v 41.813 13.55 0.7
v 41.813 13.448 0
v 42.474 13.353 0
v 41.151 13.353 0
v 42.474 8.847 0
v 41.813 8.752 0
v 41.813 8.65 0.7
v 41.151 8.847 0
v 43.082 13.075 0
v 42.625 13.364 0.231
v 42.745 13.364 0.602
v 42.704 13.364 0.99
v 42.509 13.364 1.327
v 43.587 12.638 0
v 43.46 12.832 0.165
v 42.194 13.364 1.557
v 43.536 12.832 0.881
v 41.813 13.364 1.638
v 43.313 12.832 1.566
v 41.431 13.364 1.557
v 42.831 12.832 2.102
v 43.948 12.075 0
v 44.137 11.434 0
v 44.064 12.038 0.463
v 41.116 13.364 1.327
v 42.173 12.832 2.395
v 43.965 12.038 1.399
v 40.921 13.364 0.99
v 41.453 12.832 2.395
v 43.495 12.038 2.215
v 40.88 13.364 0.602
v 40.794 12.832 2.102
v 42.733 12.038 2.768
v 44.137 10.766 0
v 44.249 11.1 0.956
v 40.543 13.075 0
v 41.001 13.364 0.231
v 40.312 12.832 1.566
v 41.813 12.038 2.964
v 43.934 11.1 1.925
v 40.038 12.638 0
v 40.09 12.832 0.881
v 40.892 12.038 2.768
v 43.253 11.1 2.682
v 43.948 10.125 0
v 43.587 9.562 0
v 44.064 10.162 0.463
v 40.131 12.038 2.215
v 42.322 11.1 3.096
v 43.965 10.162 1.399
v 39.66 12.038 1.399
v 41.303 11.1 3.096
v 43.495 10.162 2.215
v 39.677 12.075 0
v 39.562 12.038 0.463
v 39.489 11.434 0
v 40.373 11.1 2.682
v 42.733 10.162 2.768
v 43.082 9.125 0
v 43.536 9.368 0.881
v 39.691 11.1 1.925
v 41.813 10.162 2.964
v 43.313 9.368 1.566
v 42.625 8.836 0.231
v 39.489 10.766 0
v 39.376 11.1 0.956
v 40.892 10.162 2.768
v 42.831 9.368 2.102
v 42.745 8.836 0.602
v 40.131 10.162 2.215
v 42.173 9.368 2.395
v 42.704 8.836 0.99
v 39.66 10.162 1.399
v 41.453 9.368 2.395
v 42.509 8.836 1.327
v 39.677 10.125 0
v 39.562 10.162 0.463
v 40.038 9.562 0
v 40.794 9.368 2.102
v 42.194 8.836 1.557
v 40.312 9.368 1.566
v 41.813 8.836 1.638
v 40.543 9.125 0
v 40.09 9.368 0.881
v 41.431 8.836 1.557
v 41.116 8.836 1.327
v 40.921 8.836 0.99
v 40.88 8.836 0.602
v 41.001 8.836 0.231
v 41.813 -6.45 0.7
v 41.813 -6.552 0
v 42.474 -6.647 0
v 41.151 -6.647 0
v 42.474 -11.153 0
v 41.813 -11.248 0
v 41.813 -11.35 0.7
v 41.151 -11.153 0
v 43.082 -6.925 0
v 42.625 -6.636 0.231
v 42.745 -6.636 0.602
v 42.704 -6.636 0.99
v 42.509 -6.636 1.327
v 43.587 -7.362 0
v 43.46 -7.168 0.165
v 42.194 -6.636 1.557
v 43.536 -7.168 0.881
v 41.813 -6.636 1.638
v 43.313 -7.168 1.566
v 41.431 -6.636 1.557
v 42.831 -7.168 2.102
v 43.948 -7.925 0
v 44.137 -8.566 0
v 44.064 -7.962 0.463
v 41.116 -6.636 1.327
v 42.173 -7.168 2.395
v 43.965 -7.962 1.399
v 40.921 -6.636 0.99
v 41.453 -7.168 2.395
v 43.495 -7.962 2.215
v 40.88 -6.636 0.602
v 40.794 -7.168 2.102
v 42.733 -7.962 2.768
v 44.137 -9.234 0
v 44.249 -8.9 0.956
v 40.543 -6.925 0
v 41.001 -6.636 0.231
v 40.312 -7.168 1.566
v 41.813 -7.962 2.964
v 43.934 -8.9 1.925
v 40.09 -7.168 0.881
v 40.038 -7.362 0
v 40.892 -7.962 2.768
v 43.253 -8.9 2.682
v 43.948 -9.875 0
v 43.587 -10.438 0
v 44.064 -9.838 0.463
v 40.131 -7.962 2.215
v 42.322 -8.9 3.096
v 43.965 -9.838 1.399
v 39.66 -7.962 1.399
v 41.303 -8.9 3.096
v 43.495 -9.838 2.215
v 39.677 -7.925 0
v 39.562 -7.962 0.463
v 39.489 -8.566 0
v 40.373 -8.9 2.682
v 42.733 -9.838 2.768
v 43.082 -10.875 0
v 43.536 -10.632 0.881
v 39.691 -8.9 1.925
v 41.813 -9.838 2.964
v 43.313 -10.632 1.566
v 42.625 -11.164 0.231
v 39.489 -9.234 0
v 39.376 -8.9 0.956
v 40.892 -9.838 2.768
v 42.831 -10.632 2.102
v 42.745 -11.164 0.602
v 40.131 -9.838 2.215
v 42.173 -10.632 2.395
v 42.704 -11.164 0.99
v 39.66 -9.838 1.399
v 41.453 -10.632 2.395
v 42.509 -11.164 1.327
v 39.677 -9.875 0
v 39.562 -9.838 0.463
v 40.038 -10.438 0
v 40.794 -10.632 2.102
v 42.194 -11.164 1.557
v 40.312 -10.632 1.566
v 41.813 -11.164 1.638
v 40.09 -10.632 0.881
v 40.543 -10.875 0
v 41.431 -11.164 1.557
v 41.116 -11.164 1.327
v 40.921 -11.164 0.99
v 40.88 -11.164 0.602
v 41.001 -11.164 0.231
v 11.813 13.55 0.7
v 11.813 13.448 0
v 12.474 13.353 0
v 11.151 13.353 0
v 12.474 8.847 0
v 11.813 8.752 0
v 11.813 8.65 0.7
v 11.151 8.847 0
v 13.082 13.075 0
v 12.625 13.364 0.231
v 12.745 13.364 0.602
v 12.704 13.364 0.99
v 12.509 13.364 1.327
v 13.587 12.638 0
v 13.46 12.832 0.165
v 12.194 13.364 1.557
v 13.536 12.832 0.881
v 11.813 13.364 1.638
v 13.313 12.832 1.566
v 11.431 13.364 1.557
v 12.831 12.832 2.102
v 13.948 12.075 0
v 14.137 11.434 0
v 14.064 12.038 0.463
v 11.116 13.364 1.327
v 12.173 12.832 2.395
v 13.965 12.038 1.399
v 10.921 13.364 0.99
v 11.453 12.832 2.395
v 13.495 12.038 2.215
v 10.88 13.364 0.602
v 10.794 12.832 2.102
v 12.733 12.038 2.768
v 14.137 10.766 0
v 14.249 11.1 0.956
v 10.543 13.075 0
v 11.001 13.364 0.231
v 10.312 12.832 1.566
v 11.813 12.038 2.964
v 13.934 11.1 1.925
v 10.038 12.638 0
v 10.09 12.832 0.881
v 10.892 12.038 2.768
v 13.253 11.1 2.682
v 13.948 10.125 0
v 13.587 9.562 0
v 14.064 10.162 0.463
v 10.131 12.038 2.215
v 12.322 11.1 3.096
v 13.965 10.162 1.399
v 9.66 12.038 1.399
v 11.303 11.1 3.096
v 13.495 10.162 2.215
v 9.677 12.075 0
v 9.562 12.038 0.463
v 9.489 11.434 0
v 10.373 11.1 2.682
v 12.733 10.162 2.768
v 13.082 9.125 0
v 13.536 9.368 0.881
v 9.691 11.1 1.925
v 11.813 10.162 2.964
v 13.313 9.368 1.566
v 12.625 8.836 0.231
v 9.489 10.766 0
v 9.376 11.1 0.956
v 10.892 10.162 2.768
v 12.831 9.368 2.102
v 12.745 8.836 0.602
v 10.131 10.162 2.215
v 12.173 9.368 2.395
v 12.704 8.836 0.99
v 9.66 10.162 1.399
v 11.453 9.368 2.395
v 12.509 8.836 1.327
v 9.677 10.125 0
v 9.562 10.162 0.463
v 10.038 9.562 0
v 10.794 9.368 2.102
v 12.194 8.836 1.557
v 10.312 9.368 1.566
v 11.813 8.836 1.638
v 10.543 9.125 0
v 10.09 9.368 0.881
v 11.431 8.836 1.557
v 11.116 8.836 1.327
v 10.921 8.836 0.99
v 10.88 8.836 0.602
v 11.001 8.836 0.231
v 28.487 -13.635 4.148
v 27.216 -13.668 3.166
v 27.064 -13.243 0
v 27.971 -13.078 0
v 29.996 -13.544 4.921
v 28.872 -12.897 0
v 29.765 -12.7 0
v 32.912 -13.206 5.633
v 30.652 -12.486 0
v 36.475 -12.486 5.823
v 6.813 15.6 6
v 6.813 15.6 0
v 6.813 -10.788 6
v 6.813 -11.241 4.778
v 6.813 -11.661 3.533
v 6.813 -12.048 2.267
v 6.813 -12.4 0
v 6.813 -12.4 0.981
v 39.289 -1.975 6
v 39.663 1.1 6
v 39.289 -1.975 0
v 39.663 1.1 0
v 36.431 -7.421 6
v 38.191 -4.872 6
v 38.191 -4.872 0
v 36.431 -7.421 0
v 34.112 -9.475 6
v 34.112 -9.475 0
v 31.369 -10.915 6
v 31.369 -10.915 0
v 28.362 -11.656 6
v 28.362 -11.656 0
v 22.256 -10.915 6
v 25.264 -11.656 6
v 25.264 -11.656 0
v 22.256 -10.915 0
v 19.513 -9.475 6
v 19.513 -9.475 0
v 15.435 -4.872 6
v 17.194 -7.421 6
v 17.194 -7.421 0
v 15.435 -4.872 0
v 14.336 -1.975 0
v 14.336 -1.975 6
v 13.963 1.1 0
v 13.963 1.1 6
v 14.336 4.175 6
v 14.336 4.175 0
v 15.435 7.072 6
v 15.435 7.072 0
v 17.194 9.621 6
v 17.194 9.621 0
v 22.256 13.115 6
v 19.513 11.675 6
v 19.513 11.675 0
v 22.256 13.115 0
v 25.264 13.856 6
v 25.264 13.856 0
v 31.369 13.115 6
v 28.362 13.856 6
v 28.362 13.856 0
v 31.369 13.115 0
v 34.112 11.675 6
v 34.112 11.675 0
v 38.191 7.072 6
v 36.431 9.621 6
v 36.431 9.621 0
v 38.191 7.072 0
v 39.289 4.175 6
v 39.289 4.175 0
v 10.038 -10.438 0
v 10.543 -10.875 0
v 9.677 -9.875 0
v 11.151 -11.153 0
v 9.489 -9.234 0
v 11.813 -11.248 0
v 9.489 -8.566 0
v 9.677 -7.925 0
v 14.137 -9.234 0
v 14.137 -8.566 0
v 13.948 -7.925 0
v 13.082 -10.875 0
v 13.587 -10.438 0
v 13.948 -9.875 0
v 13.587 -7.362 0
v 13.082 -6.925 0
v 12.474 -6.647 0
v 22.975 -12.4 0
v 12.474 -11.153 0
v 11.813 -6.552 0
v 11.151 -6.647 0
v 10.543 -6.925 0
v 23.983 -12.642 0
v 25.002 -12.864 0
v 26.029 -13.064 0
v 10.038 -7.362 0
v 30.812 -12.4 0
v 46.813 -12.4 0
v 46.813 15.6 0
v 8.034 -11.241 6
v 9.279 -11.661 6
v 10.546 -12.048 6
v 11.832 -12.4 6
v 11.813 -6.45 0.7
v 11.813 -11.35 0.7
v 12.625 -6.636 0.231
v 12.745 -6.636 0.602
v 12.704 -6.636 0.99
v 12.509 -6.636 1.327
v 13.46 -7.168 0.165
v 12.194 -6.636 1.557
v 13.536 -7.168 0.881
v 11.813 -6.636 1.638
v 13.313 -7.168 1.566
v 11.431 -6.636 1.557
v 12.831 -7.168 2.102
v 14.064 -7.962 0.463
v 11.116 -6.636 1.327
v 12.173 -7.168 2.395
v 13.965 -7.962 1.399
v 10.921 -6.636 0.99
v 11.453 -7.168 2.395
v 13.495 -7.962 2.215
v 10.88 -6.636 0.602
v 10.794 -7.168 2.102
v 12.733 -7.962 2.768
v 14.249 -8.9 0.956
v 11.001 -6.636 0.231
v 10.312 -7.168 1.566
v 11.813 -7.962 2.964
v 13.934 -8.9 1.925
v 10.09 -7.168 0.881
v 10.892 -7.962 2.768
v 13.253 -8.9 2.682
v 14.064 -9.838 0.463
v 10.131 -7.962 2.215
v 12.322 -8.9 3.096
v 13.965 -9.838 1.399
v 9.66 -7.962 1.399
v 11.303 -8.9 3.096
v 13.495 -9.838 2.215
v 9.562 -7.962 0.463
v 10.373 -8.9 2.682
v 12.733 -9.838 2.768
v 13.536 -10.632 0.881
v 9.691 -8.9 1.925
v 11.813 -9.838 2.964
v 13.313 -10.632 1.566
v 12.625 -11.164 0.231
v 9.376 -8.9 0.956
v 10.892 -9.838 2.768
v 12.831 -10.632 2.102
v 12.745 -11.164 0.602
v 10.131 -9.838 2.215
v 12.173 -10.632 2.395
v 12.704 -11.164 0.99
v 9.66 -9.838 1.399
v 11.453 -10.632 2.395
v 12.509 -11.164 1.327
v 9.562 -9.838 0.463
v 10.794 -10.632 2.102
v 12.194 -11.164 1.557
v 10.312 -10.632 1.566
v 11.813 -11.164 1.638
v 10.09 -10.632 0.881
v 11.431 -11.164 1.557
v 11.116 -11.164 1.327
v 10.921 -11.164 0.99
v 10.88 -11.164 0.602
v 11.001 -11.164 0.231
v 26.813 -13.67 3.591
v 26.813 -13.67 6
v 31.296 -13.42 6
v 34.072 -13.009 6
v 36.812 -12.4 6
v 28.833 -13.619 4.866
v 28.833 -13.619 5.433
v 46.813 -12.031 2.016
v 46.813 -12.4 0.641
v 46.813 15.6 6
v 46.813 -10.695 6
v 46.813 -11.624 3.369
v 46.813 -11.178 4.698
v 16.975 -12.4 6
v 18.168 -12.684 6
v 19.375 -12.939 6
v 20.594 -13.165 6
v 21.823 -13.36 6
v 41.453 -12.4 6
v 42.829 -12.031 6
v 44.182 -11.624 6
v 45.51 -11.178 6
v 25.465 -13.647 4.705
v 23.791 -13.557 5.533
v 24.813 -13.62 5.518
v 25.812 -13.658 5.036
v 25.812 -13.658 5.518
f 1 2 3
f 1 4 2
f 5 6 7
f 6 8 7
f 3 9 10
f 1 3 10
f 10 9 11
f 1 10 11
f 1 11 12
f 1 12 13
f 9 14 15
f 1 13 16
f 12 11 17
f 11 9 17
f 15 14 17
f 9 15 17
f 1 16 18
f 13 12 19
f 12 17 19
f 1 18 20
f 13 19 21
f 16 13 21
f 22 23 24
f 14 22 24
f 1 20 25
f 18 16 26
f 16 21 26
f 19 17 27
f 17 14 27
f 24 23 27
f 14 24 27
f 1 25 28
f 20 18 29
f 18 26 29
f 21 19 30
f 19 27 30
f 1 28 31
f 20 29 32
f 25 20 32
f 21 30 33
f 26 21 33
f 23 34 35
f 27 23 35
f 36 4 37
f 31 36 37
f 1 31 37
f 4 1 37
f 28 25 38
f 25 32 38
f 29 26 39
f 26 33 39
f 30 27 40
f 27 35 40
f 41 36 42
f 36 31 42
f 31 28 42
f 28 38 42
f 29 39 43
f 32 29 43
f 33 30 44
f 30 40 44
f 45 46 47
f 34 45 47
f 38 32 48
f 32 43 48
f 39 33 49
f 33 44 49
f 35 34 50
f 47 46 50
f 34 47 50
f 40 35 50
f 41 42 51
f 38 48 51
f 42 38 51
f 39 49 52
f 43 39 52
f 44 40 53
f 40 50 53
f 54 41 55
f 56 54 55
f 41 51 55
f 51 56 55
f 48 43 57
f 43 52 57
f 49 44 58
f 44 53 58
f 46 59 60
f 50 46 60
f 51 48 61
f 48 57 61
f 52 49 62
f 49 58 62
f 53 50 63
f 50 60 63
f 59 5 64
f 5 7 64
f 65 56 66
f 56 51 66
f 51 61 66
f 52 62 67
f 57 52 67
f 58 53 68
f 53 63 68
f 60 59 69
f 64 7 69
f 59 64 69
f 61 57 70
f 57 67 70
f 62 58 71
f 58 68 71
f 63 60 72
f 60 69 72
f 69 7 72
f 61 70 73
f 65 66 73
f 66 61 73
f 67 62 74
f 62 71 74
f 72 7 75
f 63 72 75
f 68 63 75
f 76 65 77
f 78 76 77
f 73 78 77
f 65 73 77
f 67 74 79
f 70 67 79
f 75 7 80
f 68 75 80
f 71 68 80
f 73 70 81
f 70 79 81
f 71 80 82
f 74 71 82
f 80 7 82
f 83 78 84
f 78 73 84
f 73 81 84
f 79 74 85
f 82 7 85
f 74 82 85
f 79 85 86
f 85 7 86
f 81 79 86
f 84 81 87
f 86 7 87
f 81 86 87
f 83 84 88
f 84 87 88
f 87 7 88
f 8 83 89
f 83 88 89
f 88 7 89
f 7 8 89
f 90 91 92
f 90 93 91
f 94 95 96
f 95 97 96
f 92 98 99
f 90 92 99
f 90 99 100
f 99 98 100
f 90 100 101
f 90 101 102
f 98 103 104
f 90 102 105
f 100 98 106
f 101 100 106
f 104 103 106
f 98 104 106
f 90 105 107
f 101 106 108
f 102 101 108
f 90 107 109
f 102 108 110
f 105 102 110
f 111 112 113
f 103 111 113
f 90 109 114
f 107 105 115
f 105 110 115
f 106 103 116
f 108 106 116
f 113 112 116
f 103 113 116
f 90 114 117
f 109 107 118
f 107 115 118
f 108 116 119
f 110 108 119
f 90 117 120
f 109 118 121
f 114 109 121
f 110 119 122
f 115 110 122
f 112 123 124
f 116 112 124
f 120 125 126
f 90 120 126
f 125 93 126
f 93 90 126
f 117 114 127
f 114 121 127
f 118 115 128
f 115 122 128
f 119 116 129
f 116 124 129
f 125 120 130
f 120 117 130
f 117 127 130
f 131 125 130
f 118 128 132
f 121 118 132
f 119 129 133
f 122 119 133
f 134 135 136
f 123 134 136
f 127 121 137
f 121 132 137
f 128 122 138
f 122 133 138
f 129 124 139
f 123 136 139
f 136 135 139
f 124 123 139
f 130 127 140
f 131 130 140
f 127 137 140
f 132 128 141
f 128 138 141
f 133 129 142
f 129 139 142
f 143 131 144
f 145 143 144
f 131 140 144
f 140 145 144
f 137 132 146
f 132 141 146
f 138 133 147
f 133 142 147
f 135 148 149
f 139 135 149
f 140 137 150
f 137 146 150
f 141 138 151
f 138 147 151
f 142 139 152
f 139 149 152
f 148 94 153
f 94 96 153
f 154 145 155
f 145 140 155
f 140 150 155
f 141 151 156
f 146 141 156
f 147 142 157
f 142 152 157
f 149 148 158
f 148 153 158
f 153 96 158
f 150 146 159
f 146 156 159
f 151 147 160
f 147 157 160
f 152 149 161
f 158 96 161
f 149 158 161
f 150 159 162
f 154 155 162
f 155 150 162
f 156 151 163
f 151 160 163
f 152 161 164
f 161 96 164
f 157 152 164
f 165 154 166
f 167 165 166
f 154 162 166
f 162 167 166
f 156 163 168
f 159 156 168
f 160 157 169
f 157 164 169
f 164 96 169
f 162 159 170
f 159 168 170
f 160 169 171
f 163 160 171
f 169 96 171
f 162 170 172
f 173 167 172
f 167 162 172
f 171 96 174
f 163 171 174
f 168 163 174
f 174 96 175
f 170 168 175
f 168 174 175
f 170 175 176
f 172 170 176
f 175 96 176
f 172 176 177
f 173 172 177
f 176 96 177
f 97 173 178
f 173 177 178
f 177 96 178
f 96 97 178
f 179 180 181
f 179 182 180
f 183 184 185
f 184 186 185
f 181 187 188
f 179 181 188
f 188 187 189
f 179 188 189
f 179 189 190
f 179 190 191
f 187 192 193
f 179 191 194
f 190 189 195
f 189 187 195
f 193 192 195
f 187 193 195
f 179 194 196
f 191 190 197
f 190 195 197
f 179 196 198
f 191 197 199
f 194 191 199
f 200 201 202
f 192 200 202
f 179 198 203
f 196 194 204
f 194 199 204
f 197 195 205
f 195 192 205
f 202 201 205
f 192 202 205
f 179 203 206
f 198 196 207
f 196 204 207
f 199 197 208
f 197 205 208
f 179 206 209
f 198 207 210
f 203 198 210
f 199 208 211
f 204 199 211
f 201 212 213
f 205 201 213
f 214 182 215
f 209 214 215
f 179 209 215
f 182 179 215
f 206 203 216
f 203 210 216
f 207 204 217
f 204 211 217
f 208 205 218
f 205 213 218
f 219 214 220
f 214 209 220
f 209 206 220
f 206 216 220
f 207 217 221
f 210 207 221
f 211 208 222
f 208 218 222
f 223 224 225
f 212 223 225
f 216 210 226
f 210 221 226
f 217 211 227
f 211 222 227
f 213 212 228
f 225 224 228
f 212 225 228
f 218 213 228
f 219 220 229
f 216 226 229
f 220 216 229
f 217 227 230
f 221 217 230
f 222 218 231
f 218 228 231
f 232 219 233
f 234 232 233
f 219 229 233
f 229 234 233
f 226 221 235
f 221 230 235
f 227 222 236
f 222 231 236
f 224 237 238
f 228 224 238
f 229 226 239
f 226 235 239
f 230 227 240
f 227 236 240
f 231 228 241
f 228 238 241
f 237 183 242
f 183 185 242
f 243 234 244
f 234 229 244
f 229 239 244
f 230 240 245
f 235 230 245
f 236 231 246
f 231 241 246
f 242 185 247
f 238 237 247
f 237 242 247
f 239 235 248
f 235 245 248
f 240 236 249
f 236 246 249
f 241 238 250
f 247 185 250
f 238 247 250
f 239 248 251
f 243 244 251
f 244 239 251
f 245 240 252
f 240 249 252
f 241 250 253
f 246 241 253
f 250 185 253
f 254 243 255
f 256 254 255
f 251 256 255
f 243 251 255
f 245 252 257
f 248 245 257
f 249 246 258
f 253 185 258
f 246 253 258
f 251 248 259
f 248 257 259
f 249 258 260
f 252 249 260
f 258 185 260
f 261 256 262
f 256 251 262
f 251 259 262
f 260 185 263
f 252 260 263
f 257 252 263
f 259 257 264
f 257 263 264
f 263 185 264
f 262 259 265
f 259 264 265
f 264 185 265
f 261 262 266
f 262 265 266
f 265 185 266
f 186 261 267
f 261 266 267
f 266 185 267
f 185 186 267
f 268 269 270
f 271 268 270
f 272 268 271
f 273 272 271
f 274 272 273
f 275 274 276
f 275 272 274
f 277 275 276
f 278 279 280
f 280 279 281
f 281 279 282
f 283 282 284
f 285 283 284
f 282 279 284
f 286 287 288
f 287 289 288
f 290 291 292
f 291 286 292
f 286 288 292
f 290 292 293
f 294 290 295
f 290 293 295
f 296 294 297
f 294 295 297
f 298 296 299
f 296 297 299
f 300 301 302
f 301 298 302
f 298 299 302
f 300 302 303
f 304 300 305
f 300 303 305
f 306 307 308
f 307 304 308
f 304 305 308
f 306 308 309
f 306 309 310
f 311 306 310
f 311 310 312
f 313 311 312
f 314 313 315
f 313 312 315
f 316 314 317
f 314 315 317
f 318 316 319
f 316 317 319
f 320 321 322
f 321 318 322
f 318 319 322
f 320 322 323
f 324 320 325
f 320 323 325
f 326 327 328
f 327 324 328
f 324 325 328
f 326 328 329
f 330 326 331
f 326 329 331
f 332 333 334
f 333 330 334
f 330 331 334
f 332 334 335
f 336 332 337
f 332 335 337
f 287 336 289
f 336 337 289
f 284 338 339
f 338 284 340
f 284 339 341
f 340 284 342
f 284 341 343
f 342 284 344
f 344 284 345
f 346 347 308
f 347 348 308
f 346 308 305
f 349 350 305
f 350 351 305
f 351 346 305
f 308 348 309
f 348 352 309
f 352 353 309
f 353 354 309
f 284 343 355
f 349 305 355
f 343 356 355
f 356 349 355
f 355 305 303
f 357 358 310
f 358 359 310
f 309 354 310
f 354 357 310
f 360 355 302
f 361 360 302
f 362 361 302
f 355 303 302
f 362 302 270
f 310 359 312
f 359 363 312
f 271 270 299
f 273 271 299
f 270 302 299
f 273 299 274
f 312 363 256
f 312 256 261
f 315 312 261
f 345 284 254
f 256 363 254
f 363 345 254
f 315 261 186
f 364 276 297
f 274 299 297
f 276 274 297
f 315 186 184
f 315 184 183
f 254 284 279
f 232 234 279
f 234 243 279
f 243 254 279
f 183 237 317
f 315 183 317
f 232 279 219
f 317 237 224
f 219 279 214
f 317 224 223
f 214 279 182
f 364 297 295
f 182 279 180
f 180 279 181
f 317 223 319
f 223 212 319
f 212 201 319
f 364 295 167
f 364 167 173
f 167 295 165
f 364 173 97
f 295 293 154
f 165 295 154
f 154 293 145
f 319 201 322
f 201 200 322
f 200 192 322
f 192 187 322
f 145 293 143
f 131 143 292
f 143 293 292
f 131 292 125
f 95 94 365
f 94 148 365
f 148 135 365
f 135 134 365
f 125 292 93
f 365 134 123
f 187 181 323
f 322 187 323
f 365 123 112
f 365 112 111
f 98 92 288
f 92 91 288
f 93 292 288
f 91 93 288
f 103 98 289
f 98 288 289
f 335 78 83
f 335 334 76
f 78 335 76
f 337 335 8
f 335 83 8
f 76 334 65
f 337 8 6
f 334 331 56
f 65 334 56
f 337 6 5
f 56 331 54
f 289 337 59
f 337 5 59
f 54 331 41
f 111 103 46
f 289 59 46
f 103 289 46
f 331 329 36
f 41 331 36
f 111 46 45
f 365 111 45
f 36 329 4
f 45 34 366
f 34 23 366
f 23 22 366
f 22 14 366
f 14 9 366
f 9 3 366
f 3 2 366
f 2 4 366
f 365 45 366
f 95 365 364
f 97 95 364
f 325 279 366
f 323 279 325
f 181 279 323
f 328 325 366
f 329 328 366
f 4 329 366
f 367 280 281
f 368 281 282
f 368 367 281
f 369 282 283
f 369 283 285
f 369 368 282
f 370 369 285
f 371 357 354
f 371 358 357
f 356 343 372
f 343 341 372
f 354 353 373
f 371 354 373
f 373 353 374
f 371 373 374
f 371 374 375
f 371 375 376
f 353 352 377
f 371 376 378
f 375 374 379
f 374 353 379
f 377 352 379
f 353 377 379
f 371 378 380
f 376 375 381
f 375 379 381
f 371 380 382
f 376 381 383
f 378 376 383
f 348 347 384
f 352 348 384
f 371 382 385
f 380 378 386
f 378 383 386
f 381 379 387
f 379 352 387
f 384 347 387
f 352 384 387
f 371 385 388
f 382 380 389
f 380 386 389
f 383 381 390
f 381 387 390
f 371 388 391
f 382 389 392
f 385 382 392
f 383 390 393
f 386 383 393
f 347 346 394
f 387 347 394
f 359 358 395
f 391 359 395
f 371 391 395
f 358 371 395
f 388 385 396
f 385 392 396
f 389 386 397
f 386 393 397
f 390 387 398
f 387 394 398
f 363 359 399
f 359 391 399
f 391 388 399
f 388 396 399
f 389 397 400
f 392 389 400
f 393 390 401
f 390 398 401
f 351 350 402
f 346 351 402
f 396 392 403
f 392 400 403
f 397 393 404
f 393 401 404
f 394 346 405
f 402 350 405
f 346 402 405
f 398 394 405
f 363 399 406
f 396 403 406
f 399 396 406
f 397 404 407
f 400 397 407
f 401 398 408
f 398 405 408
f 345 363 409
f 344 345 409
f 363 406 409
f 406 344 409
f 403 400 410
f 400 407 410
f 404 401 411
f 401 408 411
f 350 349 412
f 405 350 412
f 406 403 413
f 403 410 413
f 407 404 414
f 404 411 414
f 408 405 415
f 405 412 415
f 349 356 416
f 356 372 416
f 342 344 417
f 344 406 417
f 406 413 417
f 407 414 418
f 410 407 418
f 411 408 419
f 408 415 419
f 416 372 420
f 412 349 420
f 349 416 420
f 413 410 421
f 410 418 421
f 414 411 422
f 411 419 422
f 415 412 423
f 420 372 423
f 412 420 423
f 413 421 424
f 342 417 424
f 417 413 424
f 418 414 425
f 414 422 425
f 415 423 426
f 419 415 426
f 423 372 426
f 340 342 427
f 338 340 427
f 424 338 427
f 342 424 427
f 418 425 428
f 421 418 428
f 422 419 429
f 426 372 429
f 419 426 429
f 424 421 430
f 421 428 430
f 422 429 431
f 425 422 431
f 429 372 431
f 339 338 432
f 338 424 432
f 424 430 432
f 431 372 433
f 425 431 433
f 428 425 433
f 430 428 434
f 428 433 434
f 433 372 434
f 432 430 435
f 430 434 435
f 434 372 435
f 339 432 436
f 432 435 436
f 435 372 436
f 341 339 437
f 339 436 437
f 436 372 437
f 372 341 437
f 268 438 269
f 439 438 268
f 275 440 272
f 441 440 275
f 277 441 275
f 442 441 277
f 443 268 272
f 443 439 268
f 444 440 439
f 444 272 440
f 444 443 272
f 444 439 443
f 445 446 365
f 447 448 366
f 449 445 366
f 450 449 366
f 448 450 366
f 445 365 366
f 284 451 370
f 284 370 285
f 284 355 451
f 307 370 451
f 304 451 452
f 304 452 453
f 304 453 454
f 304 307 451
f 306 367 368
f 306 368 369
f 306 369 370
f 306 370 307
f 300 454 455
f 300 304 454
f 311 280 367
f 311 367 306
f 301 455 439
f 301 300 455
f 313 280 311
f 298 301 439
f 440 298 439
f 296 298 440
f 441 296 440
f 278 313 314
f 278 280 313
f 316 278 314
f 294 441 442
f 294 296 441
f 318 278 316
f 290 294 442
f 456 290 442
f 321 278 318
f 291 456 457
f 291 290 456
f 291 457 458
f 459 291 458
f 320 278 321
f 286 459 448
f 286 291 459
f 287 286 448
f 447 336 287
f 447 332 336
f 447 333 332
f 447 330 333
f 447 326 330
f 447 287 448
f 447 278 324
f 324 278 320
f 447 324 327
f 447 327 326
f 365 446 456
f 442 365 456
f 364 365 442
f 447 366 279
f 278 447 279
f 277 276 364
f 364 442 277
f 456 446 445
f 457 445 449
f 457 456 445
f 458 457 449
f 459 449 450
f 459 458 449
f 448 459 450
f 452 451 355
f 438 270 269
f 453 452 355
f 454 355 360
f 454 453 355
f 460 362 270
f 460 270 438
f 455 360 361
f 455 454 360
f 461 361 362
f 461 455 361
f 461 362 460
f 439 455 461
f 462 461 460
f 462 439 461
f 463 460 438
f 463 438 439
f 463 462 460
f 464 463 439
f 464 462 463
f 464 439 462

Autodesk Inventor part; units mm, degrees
ref_plane "YZ Plane" through (0, 0, 0) normal (1, 0, 0) x (0, 1, 0)
ref_plane "XZ Plane" through (0, 0, 0) normal (0, 1, 0) x (-1, 0, 0)
ref_plane "Work Plane1" through (0, -12.9, 0) normal (0, 0, 1) x (1, 0, 0)
sketch "Sketch1" plane through (0, -12.9, 0) normal (0, 0, 1) x (1, 0, 0)
  circle A0 centre (26.8127, 14) radius 1.4 construction
  line L0 (6.8127, 27.5) -> (46.8127, 27.5)
  line L1 (46.8127, 27.5) -> (46.8127, 0.5)
  line L2 (46.8127, 0.5) -> (6.8127, 0.5)
  line L3 (6.8127, 0.5) -> (6.8127, 27.5)
  line L4 (6.8127, 27.5) -> (46.8127, 0.5) construction
  line L5 (46.8127, 27.5) -> (6.8127, 0.5) construction
  circle A1 centre (26.8127, 14) radius 12.7 construction
  circle A2 centre (26.8127, 14) radius 12.85
  line L6 (6.8127, 27.5) -> (46.8127, 27.5)
  line L7 (46.8127, 27.5) -> (46.8127, 28.5)
  line L8 (46.8127, 28.5) -> (6.8127, 28.5)
  line L9 (6.8127, 28.5) -> (6.8127, 27.5)
  point P0 (0, 12.9)
  dimension "d0" = 40
  dimension "d1" = 27
  dimension "d14" = 1
  dimension "d25" = 25.7
ref_plane "Work Plane2" through (14.3627, 1.55, 6) normal (0, 0, 1) x (1, 0, 0)
extrude "Extrusion1" add sketch "Sketch1" along normal up to surface (6 mm away)
ref_plane "Work Plane3" through (11.8127, 24, 6) normal (-1, 0, 0) x (0, 0, 1)
sketch "Sketch2" plane through (11.8127, 24, 6) normal (-1, 0, 0) x (0, 0, 1)
  line L0 (-13.2187, 0) -> (3.0119, 0) projected
  line L1 (-6, -35.75) -> (-6, -10.05) projected
  line L2 (-10.9, -34.4) -> (0.6933, -34.4)
  line L3 (-10.9, -31.4) -> (0.6933, -31.4)
  line L4 (-10.9, -14.4) -> (0.6933, -14.4)
  line L5 (-10.9, -11.4) -> (0.6933, -11.4)
  arc A0 (-5.3, -10.45) -> (-5.3, -15.35) centre (-5.3, -12.9) ccw
  arc A1 (-5.4335, -30.45) -> (-5.4335, -35.35) centre (-5.4335, -32.9) ccw
  line L6 (-5.4335, -35.35) -> (-5.4335, -30.45)
  line L7 (-5.3, -15.35) -> (-5.3, -10.45)
  point P0 (-6, -24)
  dimension "d22" = 4.9
  dimension "d23" = 1.5
  dimension "d24" = 1.5
revolve "Revolution1" cut sketch "Sketch2" angle 360 about axis through (11.8127, 8.65, 0.7) along (0, 1, 0) contours A0 L4 L1 | L1 L4 L7 A0 | L4 A0 L5 L1 | L1 L5 L7 L4 | L5 A0 L1 | L1 A0 L7 L5
pattern_linear "Rectangular Pattern1" count 2 spacing 20 along (0, -1, 0) count 2 spacing 30 along (1, 0, 0) of "Revolution1"
sketch "Sketch3" plane through (6.8127, -12.4, 6) normal (0, 0, 1) x (1, 0, 0)
  ellipse E0 centre (20, 24.3) end of major axis (41.0718, 24.3) minor radius 14.9 (7.3193, 12.4) -> (20, 9.4) ccw construction
  ellipse E1 centre (20, 24.3) end of major axis (41.0718, 24.3) minor radius 14.9 (20, 9.4) -> (32.6807, 12.4) ccw construction
  circle A0 centre (20, 13.5) radius 12.85 construction
  line L0 (40, 0) -> (0, 0) construction
  line L1 (40, 28) -> (40, 0) construction
  line L2 (0, 28) -> (40, 28) construction
  line L3 (0, 0) -> (0, 28) construction
  circle A1 centre (20, 13.5) radius 12.85 construction
  line L4 (40, 0) -> (0, 0) projected
  line L5 (10.0003, 0) -> (29.9997, 0)
  spline S0 degree 5 poles (2.3021, 2.9833) (5.5467, 1.2547) (9.0339, -0.0186) (12.6471, -0.8521) (16.3235, -1.2698) (20, -1.2699) knots 0 0 0 0 0 0 1 1 1 1 1 1
  spline S1 degree 5 poles (20, -1.2699) (23.6765, -1.2698) (27.3529, -0.8521) (30.9661, -0.0186) (34.4533, 1.2547) (37.6979, 2.9833) knots 0 0 0 0 0 0 1 1 1 1 1 1
  point P0 (-6.8127, 12.4)
extrude "Extrusion2" add sketch "Sketch3" against normal up to surface (6 mm away)
ref_plane "Work Plane4" through (26.8127, 23.9, 43.6151) normal (-0.7071068, 0, 0.7071068) x (-0.7071068, 0, -0.7071068)
sketch "Sketch4" plane through (26.8127, 23.9, 43.6151) normal (-0.7071068, 0, 0.7071068) x (-0.7071068, 0, -0.7071068)
  arc A0 (33.8666, 23.9) -> (15.9334, 23.9) centre (24.9, 12) ccw projected
  ellipse E0 centre (26.5979, 22.8) end of major axis (26.5979, 35.65) minor radius 9.0863 construction
  line L0 (12.4558, 36.3) -> (19.5271, 36.3) construction
  line L1 (12.4558, 8.3) -> (12.4558, 36.3) construction
  line L2 (40.74, 8.3) -> (12.4558, 8.3) construction
  line L3 (40.74, 36.3) -> (40.74, 8.3) construction
  line L4 (33.6687, 36.3) -> (40.74, 36.3) projected
  arc A1 (33.5545, 36.3) -> (9.1298, 32.4131) centre (24.9, 12) ccw
  line L5 (33.6687, 36.3) -> (40.74, 36.3) projected
  line L6 (33.5545, 36.3) -> (40.74, 36.3)
  line L7 (40.74, 36.3) -> (40.74, 42.5179)
  line L8 (40.74, 42.5179) -> (9.2813, 42.9694)
  line L9 (9.2813, 42.9694) -> (9.1298, 32.4131)
  point P0 (49.8, 23.9)
extrude "Extrusion3" cut sketch "Sketch4" against normal through all
ref_plane "Work Plane5" through (62.0266, 23.9, 8.4012) normal (0.7071068, 0, 0.7071068) x (-0.7071068, 0, 0.7071068)
sketch "Sketch5" plane through (62.0266, 23.9, 8.4012) normal (0.7071068, 0, 0.7071068) x (-0.7071068, 0, 0.7071068)
  arc A0 (33.8666, 23.9) -> (15.9334, 23.9) centre (24.9, 12) ccw projected
  arc A1 (40.4723, 32.6668) -> (9.3277, 32.6668) centre (24.9, 12) ccw
  line L0 (16.1313, 36.3) -> (11.8886, 36.3) projected
  line L1 (16.1313, 36.3) -> (16.2449, 36.3865) construction
  line L2 (16.2449, 36.3865) -> (16.1313, 36.3)
  line L3 (40.4723, 32.6668) -> (40.4723, 41.9024)
  line L4 (40.4723, 41.9024) -> (12.0732, 41.9024)
  line L5 (12.0732, 41.9024) -> (11.8886, 36.3)
  point P0 (37.9189, 23.9)
extrude "Extrusion4" cut sketch "Sketch5" against normal through all
properties part number "20_Cube_Insert_Kinematic_Mirrormount_45_Thorlabsadapter"
